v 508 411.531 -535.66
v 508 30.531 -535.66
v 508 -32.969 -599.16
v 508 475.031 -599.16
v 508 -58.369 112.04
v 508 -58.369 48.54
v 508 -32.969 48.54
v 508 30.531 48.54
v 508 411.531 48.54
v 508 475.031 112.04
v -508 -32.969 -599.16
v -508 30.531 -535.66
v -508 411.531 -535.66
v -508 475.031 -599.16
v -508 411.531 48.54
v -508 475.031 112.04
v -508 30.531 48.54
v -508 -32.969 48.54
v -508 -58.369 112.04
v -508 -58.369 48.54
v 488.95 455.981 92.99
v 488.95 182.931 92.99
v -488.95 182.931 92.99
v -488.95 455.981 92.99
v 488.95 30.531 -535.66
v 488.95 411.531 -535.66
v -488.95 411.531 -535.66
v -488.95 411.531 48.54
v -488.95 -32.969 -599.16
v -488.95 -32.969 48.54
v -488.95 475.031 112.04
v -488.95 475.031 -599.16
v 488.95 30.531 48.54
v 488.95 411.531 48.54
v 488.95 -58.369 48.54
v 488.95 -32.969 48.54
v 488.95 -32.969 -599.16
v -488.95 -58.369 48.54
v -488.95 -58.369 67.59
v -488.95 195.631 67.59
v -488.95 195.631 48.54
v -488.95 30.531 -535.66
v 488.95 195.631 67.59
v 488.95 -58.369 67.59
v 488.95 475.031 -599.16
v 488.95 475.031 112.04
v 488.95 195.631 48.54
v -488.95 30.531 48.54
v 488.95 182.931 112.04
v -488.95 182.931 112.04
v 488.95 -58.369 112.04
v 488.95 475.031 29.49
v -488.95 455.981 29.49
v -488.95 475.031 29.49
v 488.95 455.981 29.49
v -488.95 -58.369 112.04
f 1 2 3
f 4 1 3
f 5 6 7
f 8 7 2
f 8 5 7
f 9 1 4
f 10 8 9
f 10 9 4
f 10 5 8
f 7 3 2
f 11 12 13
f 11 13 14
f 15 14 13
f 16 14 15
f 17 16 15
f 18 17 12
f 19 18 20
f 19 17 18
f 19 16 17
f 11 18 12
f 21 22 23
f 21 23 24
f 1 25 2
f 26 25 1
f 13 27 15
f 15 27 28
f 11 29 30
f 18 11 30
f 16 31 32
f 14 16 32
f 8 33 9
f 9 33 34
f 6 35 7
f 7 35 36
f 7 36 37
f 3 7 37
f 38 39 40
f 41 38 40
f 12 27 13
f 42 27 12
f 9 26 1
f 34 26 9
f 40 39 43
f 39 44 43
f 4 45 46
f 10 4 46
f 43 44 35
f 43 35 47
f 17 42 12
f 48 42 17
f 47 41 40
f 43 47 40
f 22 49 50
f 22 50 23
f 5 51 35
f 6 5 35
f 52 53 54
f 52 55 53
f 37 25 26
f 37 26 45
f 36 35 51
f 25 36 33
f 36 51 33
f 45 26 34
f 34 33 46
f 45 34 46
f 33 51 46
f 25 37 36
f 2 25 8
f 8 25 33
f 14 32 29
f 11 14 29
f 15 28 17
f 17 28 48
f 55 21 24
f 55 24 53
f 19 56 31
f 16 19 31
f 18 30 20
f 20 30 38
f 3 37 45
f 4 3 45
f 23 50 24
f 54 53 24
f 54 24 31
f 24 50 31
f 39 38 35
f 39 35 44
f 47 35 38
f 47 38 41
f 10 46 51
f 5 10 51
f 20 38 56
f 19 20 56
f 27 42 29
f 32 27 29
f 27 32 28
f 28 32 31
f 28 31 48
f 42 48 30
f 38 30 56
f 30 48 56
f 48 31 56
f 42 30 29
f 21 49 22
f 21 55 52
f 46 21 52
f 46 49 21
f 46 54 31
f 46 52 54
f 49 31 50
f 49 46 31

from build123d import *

# Parameters (mm, degrees)
F0_W          = 254
F0_H          = 19.05
F1_DEPTH      = 488.95
F1_DEPTH_BACK = 488.95
F2_W          = 381
F2_H          = 584.2
F3_DEPTH      = 19.05
F4_W          = 381
F4_H          = 584.2
F5_DEPTH      = 19.05


with BuildPart() as f1:
    # F0 (on Right) → F1 (new body, two sides)
    with BuildSketch(Plane.YZ) as f1_sk:
        Polygon((475.031194, 112.039711), (182.931194, 112.039711), (182.931194, 92.989711), (455.981194, 92.989711), (455.981194, 29.489711), (475.031194, 29.489711), align=None)
        with Locations((68.631194, 58.064711)):
            Rectangle(F0_W, F0_H)
    extrude(amount=F1_DEPTH)
    extrude(f1_sk.sketch, amount=-F1_DEPTH_BACK)


with BuildPart() as f3:
    # F2 (on face) → F3 (new body)
    with BuildSketch(Plane.YZ.offset(488.95)):
        Polygon((475.031194, 112.039711), (-58.368806, 112.039711), (-58.368806, 48.539711), (-32.968806, 48.539711), (-32.968806, -599.160289), (475.031194, -599.160289), align=None)
        with Locations((221.031194, -243.560289)):
            Rectangle(F2_W, F2_H, mode=Mode.SUBTRACT)
    extrude(amount=F3_DEPTH)


with BuildPart() as f5:
    # F4 (on face) → F5 (new body)
    with BuildSketch(Plane(origin=(-488.95, 0, 0), x_dir=(0, -1, 0), z_dir=(-1, 0, 0))):
        Polygon((58.368806, 112.039711), (-475.031194, 112.039711), (-475.031194, -599.160289), (32.968806, -599.160289), (32.968806, 48.539711), (58.368806, 48.539711), align=None)
        with Locations((-221.031194, -243.560289)):
            Rectangle(F4_W, F4_H, mode=Mode.SUBTRACT)
    extrude(amount=F5_DEPTH)


solid = Compound([f1.part, f3.part, f5.part])
